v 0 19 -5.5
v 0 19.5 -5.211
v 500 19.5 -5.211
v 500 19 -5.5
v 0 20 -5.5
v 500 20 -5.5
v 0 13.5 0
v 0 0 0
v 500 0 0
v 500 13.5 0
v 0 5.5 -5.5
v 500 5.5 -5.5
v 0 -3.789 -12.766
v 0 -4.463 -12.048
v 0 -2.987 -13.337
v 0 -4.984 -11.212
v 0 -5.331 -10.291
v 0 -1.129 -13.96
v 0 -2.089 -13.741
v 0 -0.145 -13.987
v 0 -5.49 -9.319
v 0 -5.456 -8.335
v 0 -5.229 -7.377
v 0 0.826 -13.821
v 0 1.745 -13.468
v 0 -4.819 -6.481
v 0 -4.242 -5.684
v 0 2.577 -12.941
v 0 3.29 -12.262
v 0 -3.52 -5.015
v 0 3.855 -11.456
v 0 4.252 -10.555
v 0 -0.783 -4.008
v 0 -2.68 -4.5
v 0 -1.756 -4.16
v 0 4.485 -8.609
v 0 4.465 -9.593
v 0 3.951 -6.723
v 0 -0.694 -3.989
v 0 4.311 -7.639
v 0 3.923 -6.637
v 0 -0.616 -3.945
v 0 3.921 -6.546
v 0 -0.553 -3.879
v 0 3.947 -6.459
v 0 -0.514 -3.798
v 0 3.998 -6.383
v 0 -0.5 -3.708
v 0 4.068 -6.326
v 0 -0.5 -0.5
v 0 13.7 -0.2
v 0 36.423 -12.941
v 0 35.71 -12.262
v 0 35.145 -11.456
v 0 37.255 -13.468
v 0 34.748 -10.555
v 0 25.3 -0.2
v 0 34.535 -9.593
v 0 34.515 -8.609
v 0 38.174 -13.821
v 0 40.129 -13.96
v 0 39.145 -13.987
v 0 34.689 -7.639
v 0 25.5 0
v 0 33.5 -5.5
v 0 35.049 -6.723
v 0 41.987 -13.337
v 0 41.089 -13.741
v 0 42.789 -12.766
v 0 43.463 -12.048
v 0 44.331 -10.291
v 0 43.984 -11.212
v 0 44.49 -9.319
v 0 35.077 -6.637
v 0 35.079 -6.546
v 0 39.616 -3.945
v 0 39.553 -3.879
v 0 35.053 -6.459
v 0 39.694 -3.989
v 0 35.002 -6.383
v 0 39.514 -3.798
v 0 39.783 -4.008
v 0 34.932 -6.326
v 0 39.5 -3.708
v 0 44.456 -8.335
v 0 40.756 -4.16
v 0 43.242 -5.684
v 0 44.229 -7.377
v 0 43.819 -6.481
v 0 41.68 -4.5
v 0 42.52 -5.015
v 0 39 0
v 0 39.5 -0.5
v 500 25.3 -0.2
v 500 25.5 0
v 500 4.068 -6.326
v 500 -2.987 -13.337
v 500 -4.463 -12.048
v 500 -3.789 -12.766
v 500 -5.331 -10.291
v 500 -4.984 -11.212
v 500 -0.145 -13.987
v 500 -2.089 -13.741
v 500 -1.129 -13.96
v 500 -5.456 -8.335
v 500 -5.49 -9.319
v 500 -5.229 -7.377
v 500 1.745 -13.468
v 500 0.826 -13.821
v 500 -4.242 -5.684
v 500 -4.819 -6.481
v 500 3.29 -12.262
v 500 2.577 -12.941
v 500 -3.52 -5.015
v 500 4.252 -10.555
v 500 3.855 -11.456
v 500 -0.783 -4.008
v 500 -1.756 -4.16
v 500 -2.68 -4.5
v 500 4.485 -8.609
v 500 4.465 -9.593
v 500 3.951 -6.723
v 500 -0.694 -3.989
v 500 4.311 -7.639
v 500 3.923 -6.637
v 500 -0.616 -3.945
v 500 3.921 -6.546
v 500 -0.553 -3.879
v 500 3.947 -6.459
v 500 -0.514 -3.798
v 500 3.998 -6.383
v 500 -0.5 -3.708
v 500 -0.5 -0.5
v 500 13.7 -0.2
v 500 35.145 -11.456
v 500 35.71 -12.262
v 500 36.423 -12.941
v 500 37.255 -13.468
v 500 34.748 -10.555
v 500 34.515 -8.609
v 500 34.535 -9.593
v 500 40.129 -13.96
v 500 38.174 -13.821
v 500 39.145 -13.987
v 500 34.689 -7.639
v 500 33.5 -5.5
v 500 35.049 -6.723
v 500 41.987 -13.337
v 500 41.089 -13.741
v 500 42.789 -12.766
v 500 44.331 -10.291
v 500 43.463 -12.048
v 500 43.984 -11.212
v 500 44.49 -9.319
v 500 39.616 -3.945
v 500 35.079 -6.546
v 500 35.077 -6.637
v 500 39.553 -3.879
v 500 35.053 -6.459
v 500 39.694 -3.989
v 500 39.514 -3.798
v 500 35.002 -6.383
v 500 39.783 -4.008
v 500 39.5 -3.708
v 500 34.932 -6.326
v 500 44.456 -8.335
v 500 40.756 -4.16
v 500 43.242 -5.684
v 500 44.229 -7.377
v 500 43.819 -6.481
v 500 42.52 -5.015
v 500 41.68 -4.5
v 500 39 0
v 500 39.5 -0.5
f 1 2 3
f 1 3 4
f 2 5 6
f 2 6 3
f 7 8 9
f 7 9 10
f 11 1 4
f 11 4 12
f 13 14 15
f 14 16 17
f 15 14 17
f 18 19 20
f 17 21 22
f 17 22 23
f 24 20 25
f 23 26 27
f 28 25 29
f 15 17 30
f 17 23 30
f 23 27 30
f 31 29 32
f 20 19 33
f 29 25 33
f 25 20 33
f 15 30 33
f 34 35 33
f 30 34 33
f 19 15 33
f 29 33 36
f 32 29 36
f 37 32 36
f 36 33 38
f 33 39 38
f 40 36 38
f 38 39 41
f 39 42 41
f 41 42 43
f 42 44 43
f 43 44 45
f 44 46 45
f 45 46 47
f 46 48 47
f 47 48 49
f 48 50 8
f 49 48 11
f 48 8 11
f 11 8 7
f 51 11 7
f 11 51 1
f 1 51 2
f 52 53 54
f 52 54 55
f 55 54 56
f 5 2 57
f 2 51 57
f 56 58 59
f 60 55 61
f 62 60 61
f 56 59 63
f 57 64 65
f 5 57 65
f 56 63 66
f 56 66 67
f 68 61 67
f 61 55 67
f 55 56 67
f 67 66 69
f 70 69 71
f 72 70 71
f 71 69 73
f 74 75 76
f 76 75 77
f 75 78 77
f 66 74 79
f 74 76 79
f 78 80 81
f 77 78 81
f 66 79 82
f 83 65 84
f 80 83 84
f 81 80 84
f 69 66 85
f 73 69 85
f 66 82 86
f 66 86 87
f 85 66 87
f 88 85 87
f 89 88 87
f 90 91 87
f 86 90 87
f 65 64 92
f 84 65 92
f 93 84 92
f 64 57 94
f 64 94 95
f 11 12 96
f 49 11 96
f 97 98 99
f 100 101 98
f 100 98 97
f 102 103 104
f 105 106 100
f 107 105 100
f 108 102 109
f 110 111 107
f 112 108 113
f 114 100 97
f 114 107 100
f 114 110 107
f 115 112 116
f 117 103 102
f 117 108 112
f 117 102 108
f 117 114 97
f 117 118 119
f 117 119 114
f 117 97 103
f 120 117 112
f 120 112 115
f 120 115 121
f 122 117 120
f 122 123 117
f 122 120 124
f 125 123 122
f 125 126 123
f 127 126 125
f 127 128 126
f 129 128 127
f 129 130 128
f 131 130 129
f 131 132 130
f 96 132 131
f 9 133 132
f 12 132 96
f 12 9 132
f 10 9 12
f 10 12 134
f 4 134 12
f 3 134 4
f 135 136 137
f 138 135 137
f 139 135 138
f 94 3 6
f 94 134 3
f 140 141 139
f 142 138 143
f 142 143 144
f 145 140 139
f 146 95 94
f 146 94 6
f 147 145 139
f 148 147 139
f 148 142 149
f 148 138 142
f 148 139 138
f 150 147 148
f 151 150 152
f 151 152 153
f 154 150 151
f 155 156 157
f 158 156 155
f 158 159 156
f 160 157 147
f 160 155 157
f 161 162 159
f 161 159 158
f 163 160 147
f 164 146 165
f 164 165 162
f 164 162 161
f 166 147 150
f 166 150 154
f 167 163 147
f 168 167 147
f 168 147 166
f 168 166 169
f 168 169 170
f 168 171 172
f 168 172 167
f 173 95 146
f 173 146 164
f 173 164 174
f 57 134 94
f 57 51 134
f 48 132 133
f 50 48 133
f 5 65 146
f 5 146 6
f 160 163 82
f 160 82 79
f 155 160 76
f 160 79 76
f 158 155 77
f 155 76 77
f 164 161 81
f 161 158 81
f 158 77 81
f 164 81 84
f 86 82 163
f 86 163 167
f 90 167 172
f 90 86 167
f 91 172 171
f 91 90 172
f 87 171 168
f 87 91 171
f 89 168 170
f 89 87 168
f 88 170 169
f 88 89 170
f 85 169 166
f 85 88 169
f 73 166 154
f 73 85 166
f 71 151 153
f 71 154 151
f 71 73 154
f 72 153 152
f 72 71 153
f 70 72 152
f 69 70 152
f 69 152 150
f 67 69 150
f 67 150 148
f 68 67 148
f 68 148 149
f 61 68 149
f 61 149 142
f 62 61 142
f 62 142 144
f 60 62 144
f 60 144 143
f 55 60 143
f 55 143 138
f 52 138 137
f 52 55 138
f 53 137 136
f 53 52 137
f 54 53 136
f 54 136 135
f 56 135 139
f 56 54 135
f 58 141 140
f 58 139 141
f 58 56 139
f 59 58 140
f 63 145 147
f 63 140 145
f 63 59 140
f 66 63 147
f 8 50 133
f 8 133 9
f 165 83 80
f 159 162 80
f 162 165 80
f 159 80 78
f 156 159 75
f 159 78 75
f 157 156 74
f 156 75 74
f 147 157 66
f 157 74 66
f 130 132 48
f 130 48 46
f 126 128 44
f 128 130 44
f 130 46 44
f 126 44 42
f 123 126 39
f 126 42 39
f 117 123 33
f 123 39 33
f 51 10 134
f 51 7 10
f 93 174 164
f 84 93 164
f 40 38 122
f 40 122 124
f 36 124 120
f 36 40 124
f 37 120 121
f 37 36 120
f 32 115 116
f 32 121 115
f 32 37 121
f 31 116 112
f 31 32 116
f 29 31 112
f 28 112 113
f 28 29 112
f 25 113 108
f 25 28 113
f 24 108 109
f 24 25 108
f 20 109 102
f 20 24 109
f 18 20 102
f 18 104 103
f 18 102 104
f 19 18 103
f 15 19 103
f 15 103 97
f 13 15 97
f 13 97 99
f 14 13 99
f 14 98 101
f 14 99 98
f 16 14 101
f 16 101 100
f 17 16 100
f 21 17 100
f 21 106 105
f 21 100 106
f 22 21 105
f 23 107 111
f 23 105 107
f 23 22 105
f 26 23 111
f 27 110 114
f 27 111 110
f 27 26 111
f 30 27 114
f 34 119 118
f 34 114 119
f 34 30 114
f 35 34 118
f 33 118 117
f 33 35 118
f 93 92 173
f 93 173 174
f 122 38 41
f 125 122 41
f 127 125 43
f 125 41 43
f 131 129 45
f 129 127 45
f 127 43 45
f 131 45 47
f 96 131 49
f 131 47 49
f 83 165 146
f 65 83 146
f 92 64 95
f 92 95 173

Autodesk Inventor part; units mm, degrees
ref_plane "YZ Plane" through (0, 0, 0) normal (1, 0, 0) x (0, 1, 0)
ref_plane "XZ Plane" through (0, 0, 0) normal (0, 1, 0) x (-1, 0, 0)
ref_plane "XY Plane" through (0, 0, 0) normal (0, 0, 1) x (1, 0, 0)
sketch "Szkic1" plane through (0, 0, 0) normal (1, 0, 0) x (0, 1, 0)
  line L0 (13.7, -0.2) -> (25.3, -0.2)
  line L1 (13.5, 0) -> (13.7, -0.2)
  line L2 (0, 0) -> (13.5, 0)
  line L3 (-0.5, -0.5) -> (0, 0)
  line L4 (-0.5, -3.7085) -> (-0.5, -0.5)
  arc A0 (-0.783, -4.008) -> (-0.5, -3.7085) centre (-0.8, -3.7085) ccw
  arc A1 (-0.783, -4.008) -> (3.9514, -6.7229) centre (-0.5, -9) ccw
  arc A2 (4.0685, -6.3265) -> (3.9514, -6.7229) centre (4.2185, -6.5863) ccw
  line L5 (5.5, -5.5) -> (4.0685, -6.3265)
  line L6 (19, -5.5) -> (5.5, -5.5)
  line L7 (19.5, -5.2113) -> (19, -5.5)
  line L8 (20, -5.5) -> (19.5, -5.2113)
  line L9 (33.5, -5.5) -> (20, -5.5)
  line L10 (34.9315, -6.3265) -> (33.5, -5.5)
  arc A3 (35.0486, -6.7229) -> (34.9315, -6.3265) centre (34.7815, -6.5863) ccw
  arc A4 (35.0486, -6.7229) -> (39.783, -4.008) centre (39.5, -9) ccw
  arc A5 (39.5, -3.7085) -> (39.783, -4.008) centre (39.8, -3.7085) ccw
  line L11 (39.5, -0.5) -> (39.5, -3.7085)
  line L12 (39, 0) -> (39.5, -0.5)
  line L13 (25.5, 0) -> (39, 0)
  line L14 (25.3, -0.2) -> (25.5, 0)
  point P0 (19.5, 0)
extrude "Wyciągnięcie proste1" add sketch "Szkic1" along normal blind 500
properties part number "WS_10_40_Z" material "Stal nierdzewna"
